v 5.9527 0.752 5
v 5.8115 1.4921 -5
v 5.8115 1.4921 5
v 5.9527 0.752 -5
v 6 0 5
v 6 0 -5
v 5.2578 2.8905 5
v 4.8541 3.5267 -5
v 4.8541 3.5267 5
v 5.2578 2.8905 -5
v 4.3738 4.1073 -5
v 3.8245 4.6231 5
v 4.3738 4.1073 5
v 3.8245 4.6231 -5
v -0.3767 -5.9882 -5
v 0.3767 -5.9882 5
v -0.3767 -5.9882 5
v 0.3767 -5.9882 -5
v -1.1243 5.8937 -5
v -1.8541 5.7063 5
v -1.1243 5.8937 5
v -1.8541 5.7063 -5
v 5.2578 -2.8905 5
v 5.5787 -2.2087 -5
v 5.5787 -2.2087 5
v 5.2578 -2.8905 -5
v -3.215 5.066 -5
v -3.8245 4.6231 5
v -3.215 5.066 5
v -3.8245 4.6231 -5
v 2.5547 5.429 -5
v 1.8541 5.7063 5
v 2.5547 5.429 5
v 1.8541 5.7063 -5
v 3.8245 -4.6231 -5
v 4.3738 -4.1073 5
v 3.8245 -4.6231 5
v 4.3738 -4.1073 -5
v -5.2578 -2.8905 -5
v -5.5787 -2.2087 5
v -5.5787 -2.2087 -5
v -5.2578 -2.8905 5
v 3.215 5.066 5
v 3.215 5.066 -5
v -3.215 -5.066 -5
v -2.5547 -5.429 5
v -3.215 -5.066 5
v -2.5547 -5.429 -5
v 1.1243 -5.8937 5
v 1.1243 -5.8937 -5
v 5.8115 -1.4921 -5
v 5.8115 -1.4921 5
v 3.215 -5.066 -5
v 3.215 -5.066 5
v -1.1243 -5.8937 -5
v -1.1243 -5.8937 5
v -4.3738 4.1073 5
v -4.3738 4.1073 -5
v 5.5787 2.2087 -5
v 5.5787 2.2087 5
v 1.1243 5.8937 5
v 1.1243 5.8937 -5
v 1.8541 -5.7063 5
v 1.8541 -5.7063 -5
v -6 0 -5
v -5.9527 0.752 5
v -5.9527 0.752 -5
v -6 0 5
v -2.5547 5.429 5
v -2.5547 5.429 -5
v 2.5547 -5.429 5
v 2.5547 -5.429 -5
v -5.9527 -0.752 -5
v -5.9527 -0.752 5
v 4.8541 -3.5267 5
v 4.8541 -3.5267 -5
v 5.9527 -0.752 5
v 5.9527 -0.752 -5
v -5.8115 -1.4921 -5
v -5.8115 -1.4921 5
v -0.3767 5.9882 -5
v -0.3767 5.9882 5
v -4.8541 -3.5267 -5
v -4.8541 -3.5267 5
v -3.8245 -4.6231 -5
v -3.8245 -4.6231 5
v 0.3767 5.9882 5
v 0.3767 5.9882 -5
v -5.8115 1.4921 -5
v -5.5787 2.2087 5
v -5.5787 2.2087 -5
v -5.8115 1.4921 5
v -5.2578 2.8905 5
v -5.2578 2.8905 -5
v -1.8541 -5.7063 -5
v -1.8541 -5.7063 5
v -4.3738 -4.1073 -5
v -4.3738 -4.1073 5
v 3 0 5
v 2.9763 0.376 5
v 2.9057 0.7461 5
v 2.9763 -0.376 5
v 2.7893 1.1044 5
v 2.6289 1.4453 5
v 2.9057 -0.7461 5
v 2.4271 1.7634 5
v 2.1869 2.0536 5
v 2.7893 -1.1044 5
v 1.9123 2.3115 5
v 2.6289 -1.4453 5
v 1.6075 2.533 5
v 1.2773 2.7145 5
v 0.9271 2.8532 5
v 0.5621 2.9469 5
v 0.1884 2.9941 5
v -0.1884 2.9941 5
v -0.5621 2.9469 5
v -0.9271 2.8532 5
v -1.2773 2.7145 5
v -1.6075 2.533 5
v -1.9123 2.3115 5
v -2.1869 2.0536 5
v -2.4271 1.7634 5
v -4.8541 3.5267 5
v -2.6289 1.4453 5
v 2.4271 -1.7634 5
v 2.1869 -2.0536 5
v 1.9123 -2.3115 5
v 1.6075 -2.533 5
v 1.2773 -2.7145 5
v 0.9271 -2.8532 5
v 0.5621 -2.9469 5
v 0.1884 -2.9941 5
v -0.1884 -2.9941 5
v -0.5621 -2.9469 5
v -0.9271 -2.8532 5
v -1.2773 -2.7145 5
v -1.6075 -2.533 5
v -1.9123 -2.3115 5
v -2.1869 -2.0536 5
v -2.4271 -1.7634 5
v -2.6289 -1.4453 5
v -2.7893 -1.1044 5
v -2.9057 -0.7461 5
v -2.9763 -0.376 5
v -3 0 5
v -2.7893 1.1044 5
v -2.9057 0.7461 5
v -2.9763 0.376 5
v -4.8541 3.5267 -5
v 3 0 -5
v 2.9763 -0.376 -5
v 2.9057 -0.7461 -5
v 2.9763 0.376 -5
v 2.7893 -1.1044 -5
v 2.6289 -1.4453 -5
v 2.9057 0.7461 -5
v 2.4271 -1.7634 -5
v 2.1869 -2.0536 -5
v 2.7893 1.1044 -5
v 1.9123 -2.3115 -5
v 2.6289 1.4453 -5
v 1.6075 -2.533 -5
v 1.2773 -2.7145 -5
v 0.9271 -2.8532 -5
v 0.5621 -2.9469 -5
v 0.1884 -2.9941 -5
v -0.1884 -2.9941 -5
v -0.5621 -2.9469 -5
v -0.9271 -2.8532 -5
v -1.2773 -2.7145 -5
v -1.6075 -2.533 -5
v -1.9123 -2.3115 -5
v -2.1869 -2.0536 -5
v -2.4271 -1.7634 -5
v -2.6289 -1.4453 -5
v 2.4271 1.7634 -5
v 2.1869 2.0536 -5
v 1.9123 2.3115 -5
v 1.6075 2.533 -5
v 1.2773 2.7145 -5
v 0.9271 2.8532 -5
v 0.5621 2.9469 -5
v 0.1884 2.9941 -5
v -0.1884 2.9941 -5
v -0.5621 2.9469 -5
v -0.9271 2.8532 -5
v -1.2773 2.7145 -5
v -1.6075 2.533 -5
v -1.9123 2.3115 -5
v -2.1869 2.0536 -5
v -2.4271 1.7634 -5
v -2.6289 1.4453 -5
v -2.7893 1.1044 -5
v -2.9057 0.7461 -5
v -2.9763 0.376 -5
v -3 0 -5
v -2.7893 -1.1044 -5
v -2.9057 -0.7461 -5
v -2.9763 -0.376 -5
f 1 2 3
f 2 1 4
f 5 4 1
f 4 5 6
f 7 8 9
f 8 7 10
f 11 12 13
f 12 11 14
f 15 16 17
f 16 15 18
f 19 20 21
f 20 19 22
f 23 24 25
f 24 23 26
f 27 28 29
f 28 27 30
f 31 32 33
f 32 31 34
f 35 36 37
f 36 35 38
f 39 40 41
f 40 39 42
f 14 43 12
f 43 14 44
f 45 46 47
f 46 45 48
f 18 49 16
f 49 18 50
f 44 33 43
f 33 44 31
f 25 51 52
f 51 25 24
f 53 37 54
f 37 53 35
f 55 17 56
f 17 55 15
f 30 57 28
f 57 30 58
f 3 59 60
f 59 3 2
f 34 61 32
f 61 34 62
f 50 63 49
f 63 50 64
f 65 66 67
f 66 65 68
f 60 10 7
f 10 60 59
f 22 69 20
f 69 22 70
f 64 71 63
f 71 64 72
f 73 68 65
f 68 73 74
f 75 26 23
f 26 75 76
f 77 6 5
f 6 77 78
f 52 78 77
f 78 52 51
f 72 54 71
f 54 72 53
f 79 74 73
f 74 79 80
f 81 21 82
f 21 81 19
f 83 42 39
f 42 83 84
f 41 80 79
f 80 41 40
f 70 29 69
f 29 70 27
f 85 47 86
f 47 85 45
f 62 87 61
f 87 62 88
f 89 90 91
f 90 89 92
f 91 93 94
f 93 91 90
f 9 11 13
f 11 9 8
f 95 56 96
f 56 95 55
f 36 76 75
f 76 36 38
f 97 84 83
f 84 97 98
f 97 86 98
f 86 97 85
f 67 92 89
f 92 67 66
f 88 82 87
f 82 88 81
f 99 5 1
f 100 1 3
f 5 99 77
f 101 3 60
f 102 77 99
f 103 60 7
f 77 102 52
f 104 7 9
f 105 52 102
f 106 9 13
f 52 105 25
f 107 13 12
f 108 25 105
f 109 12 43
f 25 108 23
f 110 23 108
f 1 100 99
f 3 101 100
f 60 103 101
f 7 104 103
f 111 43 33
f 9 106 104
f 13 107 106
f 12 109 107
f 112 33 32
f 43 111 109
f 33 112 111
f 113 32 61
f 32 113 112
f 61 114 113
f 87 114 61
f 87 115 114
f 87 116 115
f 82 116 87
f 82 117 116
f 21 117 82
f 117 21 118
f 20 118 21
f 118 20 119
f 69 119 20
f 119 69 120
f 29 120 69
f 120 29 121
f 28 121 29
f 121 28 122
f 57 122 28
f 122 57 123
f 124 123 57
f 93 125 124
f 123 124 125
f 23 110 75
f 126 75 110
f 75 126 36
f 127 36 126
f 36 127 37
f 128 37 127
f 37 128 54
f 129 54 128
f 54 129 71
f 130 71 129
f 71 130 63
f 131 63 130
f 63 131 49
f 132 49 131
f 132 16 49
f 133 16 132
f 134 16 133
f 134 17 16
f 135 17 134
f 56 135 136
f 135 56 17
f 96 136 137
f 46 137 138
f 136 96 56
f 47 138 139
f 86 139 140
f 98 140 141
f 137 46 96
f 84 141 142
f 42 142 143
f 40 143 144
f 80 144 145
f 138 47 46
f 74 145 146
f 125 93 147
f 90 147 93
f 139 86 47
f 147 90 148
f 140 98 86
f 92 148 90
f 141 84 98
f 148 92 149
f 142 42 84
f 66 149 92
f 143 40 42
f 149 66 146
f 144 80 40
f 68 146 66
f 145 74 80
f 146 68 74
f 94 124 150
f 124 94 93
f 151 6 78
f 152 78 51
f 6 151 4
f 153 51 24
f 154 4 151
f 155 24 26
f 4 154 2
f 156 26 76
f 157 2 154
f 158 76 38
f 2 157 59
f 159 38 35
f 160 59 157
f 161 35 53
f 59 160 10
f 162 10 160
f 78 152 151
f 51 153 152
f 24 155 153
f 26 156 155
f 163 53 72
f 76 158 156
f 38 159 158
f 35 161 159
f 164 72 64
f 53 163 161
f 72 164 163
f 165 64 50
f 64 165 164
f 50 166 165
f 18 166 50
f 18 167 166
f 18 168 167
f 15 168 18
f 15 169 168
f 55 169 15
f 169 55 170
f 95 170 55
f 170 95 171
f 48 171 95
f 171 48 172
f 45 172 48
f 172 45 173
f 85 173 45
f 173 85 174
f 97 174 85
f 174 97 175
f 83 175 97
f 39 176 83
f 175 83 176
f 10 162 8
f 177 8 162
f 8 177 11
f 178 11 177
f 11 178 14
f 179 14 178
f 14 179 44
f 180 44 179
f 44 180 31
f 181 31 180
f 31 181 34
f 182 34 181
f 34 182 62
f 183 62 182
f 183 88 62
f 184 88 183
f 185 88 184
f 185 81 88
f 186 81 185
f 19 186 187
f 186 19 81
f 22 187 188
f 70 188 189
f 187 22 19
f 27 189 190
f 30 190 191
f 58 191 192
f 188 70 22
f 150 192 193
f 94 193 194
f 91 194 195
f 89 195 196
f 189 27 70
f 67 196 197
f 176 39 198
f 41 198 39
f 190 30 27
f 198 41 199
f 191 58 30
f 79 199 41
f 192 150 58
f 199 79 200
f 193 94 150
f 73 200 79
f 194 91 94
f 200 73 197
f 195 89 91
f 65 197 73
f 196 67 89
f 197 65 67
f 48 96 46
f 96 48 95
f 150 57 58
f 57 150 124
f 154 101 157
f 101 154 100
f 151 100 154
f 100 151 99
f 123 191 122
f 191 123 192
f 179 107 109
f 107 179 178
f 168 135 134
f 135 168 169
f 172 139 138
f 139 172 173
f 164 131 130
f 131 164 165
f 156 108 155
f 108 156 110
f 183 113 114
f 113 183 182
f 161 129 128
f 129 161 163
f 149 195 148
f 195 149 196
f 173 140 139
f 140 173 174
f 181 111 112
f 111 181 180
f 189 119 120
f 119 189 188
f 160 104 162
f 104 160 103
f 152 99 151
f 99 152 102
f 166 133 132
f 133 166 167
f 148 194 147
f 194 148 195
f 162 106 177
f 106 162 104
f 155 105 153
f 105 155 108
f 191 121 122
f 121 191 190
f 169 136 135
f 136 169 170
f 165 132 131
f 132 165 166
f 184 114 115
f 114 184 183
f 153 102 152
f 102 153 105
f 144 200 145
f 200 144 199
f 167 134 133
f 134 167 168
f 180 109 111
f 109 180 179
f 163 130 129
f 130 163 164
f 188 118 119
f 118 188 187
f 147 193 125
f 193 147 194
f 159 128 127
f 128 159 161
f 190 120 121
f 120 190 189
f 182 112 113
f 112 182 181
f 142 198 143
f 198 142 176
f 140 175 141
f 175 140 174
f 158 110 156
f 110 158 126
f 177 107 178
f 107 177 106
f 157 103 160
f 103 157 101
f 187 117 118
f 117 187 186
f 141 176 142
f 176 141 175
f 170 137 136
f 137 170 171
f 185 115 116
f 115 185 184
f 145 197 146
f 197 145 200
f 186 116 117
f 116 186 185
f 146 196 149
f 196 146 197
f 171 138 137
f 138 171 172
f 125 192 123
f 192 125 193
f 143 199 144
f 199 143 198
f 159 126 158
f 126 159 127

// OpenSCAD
$fn = 50;


difference() {
	union() {
		translate(v = [0, 0, -5.0000000000]) {
			cylinder(h = 10, r = 6.0000000000);
		}
	}
	union() {
		translate(v = [0, 0, -100.0000000000]) {
			cylinder(h = 200, r = 3.0000000000);
		}
	}
}
